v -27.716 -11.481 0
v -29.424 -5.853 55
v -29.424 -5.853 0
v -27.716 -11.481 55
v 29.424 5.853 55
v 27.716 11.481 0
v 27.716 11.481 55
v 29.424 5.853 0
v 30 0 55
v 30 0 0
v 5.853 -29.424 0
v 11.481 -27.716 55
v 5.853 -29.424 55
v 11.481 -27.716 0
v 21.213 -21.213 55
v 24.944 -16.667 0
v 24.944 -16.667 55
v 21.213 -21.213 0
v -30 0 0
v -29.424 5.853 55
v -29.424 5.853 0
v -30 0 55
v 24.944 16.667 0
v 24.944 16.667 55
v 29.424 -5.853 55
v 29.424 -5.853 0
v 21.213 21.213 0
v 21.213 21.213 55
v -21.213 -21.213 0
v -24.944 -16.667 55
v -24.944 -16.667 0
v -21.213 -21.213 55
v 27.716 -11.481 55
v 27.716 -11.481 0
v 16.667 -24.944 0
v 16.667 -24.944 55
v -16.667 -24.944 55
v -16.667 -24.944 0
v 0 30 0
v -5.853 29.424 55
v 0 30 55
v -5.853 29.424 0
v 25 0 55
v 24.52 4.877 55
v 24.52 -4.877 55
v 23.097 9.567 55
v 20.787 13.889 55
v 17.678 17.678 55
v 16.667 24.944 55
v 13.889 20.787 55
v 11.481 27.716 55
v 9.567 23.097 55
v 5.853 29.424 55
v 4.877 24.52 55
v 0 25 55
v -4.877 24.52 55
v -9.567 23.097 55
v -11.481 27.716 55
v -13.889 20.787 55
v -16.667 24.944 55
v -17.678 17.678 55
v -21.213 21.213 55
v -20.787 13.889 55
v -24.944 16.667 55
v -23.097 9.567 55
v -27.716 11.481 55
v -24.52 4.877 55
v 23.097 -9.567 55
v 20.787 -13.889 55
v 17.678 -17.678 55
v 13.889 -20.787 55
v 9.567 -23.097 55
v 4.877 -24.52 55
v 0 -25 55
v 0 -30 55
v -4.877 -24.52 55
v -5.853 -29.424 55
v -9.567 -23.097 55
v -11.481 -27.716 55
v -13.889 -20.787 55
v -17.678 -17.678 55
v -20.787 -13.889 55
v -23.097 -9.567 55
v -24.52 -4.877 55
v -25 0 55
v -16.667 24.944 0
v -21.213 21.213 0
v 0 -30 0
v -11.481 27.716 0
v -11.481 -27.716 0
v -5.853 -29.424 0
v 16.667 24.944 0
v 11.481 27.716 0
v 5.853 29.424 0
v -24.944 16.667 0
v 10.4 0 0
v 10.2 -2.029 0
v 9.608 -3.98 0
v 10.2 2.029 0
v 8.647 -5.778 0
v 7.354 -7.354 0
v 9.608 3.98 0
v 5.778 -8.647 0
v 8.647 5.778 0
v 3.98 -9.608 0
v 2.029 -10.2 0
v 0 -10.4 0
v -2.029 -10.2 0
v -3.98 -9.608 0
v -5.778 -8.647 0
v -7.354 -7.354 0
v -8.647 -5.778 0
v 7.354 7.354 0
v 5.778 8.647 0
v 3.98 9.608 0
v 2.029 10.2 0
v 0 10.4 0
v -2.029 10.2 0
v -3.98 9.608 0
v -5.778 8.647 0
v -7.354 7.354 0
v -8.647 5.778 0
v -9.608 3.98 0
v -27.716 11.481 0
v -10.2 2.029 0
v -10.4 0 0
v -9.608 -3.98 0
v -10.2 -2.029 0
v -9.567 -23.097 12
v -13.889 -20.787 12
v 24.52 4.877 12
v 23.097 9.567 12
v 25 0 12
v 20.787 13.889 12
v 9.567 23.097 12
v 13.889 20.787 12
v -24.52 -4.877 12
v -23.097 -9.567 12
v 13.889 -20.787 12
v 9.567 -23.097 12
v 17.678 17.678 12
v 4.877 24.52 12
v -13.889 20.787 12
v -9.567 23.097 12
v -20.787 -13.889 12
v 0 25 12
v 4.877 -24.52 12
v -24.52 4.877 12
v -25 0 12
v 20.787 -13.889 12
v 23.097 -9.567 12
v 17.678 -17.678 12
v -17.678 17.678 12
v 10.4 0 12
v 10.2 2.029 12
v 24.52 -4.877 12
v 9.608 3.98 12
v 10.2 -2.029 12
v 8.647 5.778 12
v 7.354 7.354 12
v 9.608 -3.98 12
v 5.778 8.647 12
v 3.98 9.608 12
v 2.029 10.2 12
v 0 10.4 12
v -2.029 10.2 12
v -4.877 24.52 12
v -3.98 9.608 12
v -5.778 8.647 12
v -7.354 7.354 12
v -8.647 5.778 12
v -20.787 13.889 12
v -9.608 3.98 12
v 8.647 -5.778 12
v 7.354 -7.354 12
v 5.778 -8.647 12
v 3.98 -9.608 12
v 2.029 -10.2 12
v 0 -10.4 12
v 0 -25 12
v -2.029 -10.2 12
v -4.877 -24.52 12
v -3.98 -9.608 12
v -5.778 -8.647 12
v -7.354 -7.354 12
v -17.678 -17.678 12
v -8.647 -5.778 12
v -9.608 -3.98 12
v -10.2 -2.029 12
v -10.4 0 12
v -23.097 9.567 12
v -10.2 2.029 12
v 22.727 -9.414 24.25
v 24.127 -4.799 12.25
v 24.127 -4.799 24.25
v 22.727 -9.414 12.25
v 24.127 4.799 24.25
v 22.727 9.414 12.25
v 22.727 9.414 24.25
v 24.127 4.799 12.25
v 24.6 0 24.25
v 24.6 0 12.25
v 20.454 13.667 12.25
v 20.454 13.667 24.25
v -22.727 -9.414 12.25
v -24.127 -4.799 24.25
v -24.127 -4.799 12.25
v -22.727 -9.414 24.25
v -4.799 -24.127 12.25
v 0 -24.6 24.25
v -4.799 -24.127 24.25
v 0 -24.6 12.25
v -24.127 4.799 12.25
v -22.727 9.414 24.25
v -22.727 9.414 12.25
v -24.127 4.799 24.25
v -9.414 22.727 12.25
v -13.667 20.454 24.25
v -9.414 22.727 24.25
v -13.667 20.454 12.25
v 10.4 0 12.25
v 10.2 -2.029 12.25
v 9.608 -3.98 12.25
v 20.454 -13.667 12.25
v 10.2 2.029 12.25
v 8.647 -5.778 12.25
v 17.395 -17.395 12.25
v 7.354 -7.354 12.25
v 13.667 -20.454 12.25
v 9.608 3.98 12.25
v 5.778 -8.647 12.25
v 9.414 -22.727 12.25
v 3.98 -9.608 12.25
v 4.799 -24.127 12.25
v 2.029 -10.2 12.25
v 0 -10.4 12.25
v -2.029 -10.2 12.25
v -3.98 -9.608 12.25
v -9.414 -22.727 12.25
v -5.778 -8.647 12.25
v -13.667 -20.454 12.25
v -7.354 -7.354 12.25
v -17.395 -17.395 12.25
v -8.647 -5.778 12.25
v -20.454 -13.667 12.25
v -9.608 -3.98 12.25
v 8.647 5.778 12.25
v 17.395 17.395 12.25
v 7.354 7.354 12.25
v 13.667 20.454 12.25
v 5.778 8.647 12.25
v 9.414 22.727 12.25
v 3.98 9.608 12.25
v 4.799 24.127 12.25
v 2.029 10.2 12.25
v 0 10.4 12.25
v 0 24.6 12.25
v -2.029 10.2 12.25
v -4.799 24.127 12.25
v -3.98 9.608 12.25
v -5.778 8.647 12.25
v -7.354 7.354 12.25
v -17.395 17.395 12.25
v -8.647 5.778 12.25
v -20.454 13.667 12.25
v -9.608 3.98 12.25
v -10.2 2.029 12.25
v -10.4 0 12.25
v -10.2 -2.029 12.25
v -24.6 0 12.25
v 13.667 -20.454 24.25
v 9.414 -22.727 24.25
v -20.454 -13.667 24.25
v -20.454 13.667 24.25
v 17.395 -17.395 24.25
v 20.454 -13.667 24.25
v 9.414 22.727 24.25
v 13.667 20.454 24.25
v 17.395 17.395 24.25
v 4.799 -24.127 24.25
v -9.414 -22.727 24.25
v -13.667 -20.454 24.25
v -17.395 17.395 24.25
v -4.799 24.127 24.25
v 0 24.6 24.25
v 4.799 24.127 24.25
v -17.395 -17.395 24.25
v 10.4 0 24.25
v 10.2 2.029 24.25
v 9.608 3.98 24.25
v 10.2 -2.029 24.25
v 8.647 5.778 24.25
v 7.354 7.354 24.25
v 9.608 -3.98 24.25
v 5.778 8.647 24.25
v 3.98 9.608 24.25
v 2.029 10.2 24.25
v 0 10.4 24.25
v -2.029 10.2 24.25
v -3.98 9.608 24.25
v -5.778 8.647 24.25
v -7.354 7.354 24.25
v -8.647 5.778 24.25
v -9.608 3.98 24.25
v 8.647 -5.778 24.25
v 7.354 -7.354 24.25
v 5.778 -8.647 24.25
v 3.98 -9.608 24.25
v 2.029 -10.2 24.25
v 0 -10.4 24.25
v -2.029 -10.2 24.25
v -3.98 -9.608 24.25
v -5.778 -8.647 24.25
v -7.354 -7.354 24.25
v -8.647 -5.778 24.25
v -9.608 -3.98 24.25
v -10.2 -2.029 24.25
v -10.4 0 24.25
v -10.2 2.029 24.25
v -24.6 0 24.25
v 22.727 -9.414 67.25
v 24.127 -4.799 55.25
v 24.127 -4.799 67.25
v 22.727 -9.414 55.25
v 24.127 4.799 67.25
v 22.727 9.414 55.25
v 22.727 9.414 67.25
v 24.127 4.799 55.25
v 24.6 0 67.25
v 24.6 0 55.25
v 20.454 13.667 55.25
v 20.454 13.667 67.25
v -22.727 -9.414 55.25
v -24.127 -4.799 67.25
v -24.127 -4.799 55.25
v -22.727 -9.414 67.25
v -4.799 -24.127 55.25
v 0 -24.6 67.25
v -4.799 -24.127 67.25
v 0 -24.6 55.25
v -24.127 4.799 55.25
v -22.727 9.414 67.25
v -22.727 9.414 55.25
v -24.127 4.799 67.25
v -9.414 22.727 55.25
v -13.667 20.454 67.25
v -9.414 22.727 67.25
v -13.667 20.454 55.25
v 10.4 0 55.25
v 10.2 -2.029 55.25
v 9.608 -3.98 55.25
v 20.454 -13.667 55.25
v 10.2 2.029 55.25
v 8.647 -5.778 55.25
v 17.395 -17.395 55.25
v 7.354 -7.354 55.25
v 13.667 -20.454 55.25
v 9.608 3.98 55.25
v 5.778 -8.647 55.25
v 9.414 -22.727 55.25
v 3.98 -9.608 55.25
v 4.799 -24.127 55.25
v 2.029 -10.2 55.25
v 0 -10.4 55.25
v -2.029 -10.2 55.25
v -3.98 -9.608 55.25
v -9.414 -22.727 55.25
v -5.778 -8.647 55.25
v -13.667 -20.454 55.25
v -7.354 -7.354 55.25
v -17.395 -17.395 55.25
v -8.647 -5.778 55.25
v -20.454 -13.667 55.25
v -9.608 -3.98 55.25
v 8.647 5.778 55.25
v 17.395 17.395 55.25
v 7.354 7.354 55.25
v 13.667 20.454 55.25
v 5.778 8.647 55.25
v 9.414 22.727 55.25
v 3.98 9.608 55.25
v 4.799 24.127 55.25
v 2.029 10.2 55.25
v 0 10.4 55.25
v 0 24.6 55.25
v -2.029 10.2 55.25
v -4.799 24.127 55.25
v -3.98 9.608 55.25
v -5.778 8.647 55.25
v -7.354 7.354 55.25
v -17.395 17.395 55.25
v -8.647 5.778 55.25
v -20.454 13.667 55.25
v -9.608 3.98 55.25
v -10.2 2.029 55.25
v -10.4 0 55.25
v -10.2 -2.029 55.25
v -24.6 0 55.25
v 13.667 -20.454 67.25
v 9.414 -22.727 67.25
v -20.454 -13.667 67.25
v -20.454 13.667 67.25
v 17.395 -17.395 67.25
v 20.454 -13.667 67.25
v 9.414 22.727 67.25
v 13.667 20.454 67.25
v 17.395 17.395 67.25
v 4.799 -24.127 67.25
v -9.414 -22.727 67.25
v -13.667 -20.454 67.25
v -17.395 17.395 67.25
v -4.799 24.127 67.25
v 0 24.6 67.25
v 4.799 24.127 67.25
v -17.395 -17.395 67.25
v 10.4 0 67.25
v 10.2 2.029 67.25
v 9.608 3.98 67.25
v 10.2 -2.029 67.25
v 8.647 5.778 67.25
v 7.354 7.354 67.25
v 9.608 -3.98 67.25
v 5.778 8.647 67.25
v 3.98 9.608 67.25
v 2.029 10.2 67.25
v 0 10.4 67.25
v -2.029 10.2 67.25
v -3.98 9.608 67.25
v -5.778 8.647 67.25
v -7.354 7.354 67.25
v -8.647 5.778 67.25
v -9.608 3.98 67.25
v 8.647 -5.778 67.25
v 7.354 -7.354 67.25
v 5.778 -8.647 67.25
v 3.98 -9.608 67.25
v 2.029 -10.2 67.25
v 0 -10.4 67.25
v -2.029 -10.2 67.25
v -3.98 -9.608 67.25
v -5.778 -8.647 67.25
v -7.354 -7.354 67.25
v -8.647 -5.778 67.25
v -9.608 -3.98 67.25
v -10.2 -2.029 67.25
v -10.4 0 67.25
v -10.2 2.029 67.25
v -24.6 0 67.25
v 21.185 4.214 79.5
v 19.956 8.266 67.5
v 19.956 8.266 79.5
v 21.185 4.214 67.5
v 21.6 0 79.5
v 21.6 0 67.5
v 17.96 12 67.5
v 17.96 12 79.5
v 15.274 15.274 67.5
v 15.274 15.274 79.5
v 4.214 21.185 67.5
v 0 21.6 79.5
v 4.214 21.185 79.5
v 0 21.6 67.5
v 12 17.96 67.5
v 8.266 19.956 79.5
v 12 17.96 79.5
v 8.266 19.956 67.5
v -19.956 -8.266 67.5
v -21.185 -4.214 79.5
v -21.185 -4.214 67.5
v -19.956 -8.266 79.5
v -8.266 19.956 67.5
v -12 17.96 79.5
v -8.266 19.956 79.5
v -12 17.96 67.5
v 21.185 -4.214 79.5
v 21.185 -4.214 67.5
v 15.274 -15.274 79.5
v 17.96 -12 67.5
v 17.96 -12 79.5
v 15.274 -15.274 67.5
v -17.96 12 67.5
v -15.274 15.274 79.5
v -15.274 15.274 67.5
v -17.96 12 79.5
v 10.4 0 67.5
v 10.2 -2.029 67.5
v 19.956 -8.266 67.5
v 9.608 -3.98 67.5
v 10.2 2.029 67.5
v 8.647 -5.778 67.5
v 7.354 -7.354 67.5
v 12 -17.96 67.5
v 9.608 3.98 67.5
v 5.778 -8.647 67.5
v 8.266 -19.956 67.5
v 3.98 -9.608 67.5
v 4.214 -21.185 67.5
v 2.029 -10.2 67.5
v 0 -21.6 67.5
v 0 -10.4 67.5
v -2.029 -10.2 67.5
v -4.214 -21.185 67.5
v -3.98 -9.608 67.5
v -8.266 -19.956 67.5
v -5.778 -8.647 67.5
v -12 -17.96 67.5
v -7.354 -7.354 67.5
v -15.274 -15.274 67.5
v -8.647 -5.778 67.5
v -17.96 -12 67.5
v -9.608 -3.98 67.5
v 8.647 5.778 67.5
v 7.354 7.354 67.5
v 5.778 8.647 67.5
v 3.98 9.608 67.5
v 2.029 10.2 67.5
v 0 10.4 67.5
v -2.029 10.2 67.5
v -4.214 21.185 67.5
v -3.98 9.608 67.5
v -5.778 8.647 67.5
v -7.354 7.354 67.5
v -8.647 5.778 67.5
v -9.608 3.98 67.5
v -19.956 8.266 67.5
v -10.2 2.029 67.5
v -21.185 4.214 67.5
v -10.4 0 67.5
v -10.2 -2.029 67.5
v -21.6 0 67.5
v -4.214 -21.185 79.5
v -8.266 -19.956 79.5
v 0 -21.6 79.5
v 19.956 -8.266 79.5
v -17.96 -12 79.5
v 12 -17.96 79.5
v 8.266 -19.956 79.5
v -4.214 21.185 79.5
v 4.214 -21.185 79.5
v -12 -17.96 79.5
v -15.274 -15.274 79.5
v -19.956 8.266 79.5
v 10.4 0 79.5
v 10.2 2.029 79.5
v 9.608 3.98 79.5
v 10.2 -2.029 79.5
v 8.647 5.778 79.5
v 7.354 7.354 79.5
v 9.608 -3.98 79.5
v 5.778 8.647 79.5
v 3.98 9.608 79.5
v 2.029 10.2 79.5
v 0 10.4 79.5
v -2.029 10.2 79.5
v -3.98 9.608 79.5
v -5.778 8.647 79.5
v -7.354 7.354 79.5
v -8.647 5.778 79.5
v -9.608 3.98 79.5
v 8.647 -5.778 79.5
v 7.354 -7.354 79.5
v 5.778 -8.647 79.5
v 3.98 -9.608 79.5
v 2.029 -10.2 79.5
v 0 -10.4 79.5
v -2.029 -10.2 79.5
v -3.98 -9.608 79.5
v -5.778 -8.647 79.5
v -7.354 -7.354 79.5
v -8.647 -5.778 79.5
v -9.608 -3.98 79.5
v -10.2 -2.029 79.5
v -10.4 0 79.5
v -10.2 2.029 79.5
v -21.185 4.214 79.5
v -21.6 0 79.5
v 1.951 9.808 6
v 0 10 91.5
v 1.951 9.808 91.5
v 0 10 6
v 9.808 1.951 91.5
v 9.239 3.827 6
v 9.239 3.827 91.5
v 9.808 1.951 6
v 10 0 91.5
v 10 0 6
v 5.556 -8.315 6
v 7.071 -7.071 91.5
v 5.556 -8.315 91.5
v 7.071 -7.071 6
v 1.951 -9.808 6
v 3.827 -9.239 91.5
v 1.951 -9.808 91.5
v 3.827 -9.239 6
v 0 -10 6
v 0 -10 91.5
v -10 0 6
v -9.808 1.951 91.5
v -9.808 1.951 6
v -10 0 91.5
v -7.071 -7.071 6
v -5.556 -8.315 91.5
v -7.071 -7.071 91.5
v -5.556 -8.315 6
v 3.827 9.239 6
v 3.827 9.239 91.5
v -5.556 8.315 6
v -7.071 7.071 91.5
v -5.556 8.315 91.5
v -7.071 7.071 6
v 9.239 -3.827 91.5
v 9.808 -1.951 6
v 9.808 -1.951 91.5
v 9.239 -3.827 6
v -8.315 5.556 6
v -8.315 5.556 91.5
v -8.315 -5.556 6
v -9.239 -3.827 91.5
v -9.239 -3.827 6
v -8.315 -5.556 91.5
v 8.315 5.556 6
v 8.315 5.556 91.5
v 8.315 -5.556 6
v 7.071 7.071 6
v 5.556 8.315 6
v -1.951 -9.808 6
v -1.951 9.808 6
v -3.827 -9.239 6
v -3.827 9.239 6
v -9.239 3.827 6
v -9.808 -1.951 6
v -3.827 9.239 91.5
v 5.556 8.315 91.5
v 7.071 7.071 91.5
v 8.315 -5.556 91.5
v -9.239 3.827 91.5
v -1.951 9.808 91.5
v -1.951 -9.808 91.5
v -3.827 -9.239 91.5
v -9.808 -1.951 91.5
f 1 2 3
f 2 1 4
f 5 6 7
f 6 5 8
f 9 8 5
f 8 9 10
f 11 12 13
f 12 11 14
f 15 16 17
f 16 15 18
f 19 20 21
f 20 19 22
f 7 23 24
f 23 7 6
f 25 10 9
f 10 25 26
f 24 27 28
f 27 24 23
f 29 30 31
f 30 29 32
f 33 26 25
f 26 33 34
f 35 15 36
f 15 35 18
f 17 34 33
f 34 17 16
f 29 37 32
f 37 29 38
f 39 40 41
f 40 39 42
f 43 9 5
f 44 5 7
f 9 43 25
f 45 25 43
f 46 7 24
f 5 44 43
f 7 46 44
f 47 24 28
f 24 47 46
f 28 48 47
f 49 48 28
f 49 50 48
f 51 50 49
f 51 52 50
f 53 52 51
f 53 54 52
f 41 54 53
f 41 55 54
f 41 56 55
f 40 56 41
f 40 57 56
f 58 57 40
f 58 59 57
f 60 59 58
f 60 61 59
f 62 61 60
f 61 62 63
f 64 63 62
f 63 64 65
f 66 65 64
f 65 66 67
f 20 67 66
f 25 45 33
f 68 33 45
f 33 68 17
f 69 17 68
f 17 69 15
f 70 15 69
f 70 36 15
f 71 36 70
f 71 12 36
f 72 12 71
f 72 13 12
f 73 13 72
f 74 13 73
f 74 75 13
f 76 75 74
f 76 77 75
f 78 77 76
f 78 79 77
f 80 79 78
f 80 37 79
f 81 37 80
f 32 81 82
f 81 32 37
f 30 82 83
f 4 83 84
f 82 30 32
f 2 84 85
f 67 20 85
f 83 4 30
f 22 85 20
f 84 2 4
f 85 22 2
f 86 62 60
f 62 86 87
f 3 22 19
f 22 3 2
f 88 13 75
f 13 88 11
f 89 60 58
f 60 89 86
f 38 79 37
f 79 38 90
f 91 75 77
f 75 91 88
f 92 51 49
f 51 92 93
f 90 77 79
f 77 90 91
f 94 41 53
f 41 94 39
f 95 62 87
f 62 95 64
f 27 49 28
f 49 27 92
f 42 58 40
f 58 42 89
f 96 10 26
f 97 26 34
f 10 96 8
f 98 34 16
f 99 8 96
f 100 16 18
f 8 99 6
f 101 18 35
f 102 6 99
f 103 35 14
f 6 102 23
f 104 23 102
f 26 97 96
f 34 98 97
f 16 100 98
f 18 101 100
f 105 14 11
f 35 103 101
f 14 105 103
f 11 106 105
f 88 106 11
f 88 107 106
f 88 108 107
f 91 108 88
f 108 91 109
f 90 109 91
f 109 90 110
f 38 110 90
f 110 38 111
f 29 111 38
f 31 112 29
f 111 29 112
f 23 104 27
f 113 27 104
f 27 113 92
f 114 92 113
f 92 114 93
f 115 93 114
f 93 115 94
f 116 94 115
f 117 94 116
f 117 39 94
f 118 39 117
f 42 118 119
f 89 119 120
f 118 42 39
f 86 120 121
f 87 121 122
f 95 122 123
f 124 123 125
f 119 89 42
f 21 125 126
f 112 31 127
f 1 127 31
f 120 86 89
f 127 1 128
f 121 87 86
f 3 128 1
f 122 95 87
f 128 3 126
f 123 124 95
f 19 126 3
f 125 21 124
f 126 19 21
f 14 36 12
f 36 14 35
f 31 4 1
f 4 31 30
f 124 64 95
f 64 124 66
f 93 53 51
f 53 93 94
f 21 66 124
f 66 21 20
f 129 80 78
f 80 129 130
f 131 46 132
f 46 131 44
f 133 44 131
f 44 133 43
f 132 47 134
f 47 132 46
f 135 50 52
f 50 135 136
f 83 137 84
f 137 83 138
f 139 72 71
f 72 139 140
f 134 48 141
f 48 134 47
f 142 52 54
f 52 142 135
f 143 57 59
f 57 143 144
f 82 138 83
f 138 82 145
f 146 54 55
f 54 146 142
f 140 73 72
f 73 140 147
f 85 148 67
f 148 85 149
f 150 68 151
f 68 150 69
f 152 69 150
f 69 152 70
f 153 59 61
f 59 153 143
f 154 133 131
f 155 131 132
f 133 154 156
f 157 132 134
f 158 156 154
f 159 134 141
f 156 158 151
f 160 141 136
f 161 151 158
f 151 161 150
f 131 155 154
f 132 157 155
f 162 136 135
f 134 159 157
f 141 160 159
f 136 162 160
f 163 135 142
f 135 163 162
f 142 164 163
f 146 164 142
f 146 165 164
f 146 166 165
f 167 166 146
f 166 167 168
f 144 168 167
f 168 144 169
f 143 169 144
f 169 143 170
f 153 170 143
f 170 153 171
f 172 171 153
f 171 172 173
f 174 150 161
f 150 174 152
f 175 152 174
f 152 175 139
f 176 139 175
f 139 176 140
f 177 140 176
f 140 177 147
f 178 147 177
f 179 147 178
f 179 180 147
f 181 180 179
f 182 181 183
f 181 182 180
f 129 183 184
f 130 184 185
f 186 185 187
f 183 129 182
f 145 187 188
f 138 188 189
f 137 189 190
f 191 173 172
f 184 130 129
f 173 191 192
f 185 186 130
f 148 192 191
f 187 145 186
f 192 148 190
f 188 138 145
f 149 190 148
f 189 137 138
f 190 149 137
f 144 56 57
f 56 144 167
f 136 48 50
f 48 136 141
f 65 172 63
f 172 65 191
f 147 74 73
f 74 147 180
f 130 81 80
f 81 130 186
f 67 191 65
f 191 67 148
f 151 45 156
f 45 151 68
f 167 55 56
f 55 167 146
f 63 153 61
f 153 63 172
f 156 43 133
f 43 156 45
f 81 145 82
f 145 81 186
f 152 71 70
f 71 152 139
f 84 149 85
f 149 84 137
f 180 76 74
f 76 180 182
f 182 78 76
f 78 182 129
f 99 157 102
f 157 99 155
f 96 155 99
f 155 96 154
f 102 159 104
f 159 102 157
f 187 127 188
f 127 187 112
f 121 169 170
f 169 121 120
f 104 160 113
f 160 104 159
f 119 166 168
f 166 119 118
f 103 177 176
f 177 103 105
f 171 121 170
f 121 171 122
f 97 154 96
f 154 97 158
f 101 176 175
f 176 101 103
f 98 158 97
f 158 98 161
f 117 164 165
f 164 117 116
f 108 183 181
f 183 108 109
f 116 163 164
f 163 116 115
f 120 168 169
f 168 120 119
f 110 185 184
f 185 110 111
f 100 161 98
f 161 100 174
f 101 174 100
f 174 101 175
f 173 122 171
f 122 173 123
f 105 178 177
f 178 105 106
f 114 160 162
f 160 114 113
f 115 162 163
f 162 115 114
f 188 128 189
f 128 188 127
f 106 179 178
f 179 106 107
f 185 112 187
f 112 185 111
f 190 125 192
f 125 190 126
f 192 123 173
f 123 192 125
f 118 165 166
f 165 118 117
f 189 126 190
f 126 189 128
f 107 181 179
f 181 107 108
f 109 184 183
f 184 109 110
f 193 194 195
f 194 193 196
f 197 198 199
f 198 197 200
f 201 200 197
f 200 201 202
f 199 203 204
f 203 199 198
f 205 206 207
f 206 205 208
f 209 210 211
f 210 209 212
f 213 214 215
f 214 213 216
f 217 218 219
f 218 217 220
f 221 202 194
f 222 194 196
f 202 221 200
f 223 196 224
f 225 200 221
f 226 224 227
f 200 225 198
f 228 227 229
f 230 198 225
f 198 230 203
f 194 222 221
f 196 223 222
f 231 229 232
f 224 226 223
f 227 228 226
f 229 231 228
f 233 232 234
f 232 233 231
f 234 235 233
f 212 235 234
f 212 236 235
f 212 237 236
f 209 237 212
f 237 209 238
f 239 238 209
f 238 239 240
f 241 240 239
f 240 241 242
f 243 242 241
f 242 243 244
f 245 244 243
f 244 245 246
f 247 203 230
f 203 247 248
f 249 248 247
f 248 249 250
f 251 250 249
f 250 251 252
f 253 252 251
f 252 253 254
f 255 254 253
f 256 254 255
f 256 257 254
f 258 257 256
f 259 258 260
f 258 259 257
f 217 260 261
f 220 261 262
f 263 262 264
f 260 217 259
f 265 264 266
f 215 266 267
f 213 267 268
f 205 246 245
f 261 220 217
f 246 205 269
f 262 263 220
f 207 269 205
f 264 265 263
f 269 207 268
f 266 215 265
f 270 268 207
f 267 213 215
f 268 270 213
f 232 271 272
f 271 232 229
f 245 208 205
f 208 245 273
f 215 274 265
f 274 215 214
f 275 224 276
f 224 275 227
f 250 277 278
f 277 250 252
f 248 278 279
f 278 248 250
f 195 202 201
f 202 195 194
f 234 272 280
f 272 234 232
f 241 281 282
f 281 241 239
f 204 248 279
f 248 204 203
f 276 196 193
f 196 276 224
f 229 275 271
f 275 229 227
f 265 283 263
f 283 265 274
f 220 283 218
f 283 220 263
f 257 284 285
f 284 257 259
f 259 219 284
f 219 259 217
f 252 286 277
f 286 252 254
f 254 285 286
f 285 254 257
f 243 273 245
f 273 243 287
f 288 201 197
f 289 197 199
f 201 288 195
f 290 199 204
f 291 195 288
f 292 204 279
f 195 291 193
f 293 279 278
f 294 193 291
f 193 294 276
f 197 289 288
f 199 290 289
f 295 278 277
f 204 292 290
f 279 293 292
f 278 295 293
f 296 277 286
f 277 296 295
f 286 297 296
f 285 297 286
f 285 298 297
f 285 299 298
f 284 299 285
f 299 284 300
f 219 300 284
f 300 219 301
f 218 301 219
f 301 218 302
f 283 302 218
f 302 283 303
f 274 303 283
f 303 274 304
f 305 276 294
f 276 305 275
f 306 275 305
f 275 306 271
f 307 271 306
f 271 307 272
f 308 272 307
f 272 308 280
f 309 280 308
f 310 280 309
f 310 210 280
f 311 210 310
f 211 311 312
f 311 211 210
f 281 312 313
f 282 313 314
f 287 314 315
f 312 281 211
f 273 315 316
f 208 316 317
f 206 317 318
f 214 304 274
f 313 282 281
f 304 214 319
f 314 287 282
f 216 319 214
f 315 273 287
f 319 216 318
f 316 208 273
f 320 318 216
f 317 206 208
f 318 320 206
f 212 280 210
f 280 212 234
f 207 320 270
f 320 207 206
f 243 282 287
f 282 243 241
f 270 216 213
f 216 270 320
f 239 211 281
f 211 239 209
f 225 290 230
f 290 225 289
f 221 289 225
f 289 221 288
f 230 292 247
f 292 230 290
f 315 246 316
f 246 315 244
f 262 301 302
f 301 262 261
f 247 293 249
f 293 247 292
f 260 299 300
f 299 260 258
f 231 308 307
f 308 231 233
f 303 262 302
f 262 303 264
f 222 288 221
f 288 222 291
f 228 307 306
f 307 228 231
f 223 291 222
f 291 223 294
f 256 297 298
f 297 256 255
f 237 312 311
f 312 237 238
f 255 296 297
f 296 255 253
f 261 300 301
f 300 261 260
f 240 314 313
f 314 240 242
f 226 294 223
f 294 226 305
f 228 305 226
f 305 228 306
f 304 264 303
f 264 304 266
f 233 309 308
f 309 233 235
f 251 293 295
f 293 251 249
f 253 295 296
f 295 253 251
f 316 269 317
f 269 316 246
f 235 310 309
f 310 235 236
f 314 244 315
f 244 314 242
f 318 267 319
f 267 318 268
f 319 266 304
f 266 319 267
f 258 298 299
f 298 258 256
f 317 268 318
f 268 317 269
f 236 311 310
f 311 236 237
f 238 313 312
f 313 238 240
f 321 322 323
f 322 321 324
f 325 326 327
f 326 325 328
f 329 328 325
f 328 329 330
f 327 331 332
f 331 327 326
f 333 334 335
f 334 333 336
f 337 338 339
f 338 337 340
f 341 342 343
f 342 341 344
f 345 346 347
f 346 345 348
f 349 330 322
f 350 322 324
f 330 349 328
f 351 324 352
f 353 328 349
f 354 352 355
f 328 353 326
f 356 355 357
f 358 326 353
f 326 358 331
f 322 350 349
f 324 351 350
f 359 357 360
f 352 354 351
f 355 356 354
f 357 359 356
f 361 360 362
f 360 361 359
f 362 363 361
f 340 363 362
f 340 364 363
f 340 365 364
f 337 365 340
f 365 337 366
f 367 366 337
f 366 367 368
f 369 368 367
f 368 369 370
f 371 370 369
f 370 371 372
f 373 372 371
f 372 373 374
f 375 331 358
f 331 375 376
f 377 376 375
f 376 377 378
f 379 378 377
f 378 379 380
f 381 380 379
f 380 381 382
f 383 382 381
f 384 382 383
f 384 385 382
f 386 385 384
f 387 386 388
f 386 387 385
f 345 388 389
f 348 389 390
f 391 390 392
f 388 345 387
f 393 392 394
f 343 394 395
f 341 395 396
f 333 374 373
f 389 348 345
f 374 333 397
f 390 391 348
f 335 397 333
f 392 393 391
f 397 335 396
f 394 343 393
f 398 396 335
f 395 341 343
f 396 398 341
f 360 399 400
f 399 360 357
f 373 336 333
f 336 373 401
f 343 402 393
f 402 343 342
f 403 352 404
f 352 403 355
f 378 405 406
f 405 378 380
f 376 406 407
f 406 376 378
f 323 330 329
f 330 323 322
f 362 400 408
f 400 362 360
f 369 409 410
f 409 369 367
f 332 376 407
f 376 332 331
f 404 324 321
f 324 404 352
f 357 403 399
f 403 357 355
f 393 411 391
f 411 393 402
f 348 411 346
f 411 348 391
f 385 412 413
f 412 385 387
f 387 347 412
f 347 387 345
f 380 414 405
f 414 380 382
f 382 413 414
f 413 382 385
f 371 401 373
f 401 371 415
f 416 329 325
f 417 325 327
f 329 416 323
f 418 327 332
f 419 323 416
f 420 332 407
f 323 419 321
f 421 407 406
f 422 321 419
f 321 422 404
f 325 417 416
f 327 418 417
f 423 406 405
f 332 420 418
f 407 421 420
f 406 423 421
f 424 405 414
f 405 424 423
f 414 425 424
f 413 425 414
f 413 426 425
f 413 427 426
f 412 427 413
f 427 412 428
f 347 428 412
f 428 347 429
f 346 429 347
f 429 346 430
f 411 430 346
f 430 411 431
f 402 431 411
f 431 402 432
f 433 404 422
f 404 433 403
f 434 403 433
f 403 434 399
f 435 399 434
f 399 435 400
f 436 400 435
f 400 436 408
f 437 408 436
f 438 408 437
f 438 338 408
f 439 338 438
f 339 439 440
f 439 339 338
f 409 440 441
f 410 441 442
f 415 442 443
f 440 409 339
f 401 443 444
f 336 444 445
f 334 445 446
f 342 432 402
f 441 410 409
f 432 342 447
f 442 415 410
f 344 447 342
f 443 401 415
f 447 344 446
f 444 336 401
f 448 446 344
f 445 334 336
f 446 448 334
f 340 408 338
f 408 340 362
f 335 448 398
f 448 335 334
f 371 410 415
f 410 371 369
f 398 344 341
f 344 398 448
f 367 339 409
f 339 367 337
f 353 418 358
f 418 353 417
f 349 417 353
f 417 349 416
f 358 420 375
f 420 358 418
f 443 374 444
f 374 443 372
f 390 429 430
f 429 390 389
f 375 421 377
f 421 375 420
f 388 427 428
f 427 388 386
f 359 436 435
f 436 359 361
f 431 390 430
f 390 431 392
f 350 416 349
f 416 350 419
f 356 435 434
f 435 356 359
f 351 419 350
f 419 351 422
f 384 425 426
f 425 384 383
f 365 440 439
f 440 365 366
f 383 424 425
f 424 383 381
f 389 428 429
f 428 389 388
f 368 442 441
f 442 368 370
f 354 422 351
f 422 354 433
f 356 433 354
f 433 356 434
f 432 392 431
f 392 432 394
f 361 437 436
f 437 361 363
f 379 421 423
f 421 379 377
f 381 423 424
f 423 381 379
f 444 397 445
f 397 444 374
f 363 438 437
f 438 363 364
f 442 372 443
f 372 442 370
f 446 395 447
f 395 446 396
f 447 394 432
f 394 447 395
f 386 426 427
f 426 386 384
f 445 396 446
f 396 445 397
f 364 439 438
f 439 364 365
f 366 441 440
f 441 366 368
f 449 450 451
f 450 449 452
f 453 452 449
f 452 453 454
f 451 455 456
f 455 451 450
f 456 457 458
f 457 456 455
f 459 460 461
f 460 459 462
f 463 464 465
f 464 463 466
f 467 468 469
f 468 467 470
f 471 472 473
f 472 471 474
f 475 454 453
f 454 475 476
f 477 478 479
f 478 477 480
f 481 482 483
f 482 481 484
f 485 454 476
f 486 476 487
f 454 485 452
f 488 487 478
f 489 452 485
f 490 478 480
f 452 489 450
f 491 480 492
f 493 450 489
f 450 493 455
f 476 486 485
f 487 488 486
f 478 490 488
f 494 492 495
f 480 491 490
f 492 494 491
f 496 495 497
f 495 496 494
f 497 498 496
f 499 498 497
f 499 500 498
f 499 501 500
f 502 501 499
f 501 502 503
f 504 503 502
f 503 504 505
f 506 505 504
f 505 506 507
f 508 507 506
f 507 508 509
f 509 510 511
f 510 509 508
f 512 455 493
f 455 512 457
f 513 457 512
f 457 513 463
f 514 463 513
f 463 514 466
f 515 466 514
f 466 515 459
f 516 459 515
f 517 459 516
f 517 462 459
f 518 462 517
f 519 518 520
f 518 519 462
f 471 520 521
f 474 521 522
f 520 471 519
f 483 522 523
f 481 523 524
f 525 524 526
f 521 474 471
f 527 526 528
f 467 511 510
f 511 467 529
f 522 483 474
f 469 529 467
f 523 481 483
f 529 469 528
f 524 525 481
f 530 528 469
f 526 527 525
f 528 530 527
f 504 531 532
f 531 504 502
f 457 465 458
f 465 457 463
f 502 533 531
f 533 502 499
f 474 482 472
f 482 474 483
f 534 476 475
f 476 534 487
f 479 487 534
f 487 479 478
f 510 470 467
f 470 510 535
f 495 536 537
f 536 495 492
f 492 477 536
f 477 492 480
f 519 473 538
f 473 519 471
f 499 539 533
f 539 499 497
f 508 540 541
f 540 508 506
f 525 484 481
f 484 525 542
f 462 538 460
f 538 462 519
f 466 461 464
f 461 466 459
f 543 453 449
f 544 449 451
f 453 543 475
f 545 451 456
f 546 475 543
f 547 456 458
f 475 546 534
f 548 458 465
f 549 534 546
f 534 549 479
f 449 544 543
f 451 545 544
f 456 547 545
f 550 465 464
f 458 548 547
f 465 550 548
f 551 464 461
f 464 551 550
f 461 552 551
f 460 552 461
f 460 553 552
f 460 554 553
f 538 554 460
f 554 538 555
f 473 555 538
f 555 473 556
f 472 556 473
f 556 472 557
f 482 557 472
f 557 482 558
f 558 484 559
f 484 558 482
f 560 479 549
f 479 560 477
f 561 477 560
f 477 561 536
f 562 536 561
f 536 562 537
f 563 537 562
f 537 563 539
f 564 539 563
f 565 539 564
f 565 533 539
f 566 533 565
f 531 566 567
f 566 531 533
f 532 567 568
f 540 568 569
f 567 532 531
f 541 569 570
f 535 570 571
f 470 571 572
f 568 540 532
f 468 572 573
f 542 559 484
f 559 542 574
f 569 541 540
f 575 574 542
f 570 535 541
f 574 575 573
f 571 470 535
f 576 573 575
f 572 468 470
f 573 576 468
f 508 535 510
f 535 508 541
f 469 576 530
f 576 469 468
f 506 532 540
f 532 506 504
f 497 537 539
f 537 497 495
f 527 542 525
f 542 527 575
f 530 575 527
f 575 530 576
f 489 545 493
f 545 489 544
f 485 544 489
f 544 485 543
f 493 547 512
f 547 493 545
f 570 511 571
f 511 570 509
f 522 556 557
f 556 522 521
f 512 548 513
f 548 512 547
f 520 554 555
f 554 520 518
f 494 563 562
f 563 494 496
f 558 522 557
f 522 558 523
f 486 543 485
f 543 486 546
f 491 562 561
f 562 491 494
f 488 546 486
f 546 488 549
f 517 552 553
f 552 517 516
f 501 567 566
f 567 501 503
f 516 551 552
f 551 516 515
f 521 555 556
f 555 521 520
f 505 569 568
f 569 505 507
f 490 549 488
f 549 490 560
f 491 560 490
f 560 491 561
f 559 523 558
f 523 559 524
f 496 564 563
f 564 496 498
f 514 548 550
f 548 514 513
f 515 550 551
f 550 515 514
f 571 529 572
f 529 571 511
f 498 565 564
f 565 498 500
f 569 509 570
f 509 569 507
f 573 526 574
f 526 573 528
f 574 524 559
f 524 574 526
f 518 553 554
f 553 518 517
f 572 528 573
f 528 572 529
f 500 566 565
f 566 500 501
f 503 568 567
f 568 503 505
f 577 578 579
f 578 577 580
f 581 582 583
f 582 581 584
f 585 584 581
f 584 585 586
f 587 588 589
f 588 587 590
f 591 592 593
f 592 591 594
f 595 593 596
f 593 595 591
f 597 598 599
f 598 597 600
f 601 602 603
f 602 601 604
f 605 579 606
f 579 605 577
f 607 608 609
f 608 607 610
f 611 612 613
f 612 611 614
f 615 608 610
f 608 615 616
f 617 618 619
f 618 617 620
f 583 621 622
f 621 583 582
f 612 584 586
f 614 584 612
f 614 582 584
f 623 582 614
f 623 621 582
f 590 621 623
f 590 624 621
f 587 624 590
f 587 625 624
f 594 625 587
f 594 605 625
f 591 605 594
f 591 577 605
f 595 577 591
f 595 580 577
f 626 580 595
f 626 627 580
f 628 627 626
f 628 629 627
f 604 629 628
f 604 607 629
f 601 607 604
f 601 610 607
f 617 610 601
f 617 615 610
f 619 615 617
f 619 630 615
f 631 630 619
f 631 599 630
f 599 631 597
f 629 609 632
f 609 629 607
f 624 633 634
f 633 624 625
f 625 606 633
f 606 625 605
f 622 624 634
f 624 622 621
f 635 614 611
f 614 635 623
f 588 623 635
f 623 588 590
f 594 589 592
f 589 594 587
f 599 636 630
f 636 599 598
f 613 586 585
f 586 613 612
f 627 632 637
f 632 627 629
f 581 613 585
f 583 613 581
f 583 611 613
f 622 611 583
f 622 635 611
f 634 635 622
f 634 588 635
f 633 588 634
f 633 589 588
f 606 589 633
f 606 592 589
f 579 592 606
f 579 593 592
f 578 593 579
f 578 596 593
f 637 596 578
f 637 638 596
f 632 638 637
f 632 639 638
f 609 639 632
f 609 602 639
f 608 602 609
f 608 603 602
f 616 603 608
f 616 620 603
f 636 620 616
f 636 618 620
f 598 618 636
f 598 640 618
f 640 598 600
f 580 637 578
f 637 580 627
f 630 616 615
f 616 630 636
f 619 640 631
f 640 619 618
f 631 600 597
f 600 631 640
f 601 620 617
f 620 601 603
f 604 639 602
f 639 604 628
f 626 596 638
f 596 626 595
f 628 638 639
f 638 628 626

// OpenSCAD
$fn = 32;

// ------------------------------------------------------------------------
// Bearing housing: housing d60, two bearings and a shaft
// Every part is its own module, assembly() places them once.
// ------------------------------------------------------------------------

// --- part 1 ---
module housing() {
  difference() {
    cylinder(h = 55, d = 60);
    translate([0, 0, 12]) cylinder(h = 44, d = 50);
    translate([0, 0, -1]) cylinder(h = 14, d = 20.8);
  }
}

// --- part 2 ---
module bearing_lower() {
  difference() {
      translate([0, 0, 0]) cylinder(h = 12, d = 49.2);
      translate([0, 0, -1]) cylinder(h = 14, d = 20.8);
    }
}

// --- part 3 ---
module bearing_upper() {
  difference() {
      translate([0, 0, 0]) cylinder(h = 12, d = 49.2);
      translate([0, 0, -1]) cylinder(h = 14, d = 20.8);
    }
}

// --- part 4 ---
module spacer() {
  difference() {
      translate([0, 0, 0]) cylinder(h = 12, d = 43.2);
      translate([0, 0, -1]) cylinder(h = 14, d = 20.8);
    }
}

// --- part 5 ---
module shaft() {
  translate([0, 0, -42.75]) cylinder(h = 85.5, d = 20);
}

// --- assembly ---
module assembly() {
  translate([0, 0, 0]) rotate([0, 0, 0]) housing();
  translate([0, 0, 12.25]) rotate([0, 0, 0]) bearing_lower();
  translate([0, 0, 55.25]) rotate([0, 0, 0]) bearing_upper();
  translate([0, 0, 67.5]) rotate([0, 0, 0]) spacer();
  translate([0, 0, 48.75]) rotate([0, 0, 0]) shaft();
}

assembly();
